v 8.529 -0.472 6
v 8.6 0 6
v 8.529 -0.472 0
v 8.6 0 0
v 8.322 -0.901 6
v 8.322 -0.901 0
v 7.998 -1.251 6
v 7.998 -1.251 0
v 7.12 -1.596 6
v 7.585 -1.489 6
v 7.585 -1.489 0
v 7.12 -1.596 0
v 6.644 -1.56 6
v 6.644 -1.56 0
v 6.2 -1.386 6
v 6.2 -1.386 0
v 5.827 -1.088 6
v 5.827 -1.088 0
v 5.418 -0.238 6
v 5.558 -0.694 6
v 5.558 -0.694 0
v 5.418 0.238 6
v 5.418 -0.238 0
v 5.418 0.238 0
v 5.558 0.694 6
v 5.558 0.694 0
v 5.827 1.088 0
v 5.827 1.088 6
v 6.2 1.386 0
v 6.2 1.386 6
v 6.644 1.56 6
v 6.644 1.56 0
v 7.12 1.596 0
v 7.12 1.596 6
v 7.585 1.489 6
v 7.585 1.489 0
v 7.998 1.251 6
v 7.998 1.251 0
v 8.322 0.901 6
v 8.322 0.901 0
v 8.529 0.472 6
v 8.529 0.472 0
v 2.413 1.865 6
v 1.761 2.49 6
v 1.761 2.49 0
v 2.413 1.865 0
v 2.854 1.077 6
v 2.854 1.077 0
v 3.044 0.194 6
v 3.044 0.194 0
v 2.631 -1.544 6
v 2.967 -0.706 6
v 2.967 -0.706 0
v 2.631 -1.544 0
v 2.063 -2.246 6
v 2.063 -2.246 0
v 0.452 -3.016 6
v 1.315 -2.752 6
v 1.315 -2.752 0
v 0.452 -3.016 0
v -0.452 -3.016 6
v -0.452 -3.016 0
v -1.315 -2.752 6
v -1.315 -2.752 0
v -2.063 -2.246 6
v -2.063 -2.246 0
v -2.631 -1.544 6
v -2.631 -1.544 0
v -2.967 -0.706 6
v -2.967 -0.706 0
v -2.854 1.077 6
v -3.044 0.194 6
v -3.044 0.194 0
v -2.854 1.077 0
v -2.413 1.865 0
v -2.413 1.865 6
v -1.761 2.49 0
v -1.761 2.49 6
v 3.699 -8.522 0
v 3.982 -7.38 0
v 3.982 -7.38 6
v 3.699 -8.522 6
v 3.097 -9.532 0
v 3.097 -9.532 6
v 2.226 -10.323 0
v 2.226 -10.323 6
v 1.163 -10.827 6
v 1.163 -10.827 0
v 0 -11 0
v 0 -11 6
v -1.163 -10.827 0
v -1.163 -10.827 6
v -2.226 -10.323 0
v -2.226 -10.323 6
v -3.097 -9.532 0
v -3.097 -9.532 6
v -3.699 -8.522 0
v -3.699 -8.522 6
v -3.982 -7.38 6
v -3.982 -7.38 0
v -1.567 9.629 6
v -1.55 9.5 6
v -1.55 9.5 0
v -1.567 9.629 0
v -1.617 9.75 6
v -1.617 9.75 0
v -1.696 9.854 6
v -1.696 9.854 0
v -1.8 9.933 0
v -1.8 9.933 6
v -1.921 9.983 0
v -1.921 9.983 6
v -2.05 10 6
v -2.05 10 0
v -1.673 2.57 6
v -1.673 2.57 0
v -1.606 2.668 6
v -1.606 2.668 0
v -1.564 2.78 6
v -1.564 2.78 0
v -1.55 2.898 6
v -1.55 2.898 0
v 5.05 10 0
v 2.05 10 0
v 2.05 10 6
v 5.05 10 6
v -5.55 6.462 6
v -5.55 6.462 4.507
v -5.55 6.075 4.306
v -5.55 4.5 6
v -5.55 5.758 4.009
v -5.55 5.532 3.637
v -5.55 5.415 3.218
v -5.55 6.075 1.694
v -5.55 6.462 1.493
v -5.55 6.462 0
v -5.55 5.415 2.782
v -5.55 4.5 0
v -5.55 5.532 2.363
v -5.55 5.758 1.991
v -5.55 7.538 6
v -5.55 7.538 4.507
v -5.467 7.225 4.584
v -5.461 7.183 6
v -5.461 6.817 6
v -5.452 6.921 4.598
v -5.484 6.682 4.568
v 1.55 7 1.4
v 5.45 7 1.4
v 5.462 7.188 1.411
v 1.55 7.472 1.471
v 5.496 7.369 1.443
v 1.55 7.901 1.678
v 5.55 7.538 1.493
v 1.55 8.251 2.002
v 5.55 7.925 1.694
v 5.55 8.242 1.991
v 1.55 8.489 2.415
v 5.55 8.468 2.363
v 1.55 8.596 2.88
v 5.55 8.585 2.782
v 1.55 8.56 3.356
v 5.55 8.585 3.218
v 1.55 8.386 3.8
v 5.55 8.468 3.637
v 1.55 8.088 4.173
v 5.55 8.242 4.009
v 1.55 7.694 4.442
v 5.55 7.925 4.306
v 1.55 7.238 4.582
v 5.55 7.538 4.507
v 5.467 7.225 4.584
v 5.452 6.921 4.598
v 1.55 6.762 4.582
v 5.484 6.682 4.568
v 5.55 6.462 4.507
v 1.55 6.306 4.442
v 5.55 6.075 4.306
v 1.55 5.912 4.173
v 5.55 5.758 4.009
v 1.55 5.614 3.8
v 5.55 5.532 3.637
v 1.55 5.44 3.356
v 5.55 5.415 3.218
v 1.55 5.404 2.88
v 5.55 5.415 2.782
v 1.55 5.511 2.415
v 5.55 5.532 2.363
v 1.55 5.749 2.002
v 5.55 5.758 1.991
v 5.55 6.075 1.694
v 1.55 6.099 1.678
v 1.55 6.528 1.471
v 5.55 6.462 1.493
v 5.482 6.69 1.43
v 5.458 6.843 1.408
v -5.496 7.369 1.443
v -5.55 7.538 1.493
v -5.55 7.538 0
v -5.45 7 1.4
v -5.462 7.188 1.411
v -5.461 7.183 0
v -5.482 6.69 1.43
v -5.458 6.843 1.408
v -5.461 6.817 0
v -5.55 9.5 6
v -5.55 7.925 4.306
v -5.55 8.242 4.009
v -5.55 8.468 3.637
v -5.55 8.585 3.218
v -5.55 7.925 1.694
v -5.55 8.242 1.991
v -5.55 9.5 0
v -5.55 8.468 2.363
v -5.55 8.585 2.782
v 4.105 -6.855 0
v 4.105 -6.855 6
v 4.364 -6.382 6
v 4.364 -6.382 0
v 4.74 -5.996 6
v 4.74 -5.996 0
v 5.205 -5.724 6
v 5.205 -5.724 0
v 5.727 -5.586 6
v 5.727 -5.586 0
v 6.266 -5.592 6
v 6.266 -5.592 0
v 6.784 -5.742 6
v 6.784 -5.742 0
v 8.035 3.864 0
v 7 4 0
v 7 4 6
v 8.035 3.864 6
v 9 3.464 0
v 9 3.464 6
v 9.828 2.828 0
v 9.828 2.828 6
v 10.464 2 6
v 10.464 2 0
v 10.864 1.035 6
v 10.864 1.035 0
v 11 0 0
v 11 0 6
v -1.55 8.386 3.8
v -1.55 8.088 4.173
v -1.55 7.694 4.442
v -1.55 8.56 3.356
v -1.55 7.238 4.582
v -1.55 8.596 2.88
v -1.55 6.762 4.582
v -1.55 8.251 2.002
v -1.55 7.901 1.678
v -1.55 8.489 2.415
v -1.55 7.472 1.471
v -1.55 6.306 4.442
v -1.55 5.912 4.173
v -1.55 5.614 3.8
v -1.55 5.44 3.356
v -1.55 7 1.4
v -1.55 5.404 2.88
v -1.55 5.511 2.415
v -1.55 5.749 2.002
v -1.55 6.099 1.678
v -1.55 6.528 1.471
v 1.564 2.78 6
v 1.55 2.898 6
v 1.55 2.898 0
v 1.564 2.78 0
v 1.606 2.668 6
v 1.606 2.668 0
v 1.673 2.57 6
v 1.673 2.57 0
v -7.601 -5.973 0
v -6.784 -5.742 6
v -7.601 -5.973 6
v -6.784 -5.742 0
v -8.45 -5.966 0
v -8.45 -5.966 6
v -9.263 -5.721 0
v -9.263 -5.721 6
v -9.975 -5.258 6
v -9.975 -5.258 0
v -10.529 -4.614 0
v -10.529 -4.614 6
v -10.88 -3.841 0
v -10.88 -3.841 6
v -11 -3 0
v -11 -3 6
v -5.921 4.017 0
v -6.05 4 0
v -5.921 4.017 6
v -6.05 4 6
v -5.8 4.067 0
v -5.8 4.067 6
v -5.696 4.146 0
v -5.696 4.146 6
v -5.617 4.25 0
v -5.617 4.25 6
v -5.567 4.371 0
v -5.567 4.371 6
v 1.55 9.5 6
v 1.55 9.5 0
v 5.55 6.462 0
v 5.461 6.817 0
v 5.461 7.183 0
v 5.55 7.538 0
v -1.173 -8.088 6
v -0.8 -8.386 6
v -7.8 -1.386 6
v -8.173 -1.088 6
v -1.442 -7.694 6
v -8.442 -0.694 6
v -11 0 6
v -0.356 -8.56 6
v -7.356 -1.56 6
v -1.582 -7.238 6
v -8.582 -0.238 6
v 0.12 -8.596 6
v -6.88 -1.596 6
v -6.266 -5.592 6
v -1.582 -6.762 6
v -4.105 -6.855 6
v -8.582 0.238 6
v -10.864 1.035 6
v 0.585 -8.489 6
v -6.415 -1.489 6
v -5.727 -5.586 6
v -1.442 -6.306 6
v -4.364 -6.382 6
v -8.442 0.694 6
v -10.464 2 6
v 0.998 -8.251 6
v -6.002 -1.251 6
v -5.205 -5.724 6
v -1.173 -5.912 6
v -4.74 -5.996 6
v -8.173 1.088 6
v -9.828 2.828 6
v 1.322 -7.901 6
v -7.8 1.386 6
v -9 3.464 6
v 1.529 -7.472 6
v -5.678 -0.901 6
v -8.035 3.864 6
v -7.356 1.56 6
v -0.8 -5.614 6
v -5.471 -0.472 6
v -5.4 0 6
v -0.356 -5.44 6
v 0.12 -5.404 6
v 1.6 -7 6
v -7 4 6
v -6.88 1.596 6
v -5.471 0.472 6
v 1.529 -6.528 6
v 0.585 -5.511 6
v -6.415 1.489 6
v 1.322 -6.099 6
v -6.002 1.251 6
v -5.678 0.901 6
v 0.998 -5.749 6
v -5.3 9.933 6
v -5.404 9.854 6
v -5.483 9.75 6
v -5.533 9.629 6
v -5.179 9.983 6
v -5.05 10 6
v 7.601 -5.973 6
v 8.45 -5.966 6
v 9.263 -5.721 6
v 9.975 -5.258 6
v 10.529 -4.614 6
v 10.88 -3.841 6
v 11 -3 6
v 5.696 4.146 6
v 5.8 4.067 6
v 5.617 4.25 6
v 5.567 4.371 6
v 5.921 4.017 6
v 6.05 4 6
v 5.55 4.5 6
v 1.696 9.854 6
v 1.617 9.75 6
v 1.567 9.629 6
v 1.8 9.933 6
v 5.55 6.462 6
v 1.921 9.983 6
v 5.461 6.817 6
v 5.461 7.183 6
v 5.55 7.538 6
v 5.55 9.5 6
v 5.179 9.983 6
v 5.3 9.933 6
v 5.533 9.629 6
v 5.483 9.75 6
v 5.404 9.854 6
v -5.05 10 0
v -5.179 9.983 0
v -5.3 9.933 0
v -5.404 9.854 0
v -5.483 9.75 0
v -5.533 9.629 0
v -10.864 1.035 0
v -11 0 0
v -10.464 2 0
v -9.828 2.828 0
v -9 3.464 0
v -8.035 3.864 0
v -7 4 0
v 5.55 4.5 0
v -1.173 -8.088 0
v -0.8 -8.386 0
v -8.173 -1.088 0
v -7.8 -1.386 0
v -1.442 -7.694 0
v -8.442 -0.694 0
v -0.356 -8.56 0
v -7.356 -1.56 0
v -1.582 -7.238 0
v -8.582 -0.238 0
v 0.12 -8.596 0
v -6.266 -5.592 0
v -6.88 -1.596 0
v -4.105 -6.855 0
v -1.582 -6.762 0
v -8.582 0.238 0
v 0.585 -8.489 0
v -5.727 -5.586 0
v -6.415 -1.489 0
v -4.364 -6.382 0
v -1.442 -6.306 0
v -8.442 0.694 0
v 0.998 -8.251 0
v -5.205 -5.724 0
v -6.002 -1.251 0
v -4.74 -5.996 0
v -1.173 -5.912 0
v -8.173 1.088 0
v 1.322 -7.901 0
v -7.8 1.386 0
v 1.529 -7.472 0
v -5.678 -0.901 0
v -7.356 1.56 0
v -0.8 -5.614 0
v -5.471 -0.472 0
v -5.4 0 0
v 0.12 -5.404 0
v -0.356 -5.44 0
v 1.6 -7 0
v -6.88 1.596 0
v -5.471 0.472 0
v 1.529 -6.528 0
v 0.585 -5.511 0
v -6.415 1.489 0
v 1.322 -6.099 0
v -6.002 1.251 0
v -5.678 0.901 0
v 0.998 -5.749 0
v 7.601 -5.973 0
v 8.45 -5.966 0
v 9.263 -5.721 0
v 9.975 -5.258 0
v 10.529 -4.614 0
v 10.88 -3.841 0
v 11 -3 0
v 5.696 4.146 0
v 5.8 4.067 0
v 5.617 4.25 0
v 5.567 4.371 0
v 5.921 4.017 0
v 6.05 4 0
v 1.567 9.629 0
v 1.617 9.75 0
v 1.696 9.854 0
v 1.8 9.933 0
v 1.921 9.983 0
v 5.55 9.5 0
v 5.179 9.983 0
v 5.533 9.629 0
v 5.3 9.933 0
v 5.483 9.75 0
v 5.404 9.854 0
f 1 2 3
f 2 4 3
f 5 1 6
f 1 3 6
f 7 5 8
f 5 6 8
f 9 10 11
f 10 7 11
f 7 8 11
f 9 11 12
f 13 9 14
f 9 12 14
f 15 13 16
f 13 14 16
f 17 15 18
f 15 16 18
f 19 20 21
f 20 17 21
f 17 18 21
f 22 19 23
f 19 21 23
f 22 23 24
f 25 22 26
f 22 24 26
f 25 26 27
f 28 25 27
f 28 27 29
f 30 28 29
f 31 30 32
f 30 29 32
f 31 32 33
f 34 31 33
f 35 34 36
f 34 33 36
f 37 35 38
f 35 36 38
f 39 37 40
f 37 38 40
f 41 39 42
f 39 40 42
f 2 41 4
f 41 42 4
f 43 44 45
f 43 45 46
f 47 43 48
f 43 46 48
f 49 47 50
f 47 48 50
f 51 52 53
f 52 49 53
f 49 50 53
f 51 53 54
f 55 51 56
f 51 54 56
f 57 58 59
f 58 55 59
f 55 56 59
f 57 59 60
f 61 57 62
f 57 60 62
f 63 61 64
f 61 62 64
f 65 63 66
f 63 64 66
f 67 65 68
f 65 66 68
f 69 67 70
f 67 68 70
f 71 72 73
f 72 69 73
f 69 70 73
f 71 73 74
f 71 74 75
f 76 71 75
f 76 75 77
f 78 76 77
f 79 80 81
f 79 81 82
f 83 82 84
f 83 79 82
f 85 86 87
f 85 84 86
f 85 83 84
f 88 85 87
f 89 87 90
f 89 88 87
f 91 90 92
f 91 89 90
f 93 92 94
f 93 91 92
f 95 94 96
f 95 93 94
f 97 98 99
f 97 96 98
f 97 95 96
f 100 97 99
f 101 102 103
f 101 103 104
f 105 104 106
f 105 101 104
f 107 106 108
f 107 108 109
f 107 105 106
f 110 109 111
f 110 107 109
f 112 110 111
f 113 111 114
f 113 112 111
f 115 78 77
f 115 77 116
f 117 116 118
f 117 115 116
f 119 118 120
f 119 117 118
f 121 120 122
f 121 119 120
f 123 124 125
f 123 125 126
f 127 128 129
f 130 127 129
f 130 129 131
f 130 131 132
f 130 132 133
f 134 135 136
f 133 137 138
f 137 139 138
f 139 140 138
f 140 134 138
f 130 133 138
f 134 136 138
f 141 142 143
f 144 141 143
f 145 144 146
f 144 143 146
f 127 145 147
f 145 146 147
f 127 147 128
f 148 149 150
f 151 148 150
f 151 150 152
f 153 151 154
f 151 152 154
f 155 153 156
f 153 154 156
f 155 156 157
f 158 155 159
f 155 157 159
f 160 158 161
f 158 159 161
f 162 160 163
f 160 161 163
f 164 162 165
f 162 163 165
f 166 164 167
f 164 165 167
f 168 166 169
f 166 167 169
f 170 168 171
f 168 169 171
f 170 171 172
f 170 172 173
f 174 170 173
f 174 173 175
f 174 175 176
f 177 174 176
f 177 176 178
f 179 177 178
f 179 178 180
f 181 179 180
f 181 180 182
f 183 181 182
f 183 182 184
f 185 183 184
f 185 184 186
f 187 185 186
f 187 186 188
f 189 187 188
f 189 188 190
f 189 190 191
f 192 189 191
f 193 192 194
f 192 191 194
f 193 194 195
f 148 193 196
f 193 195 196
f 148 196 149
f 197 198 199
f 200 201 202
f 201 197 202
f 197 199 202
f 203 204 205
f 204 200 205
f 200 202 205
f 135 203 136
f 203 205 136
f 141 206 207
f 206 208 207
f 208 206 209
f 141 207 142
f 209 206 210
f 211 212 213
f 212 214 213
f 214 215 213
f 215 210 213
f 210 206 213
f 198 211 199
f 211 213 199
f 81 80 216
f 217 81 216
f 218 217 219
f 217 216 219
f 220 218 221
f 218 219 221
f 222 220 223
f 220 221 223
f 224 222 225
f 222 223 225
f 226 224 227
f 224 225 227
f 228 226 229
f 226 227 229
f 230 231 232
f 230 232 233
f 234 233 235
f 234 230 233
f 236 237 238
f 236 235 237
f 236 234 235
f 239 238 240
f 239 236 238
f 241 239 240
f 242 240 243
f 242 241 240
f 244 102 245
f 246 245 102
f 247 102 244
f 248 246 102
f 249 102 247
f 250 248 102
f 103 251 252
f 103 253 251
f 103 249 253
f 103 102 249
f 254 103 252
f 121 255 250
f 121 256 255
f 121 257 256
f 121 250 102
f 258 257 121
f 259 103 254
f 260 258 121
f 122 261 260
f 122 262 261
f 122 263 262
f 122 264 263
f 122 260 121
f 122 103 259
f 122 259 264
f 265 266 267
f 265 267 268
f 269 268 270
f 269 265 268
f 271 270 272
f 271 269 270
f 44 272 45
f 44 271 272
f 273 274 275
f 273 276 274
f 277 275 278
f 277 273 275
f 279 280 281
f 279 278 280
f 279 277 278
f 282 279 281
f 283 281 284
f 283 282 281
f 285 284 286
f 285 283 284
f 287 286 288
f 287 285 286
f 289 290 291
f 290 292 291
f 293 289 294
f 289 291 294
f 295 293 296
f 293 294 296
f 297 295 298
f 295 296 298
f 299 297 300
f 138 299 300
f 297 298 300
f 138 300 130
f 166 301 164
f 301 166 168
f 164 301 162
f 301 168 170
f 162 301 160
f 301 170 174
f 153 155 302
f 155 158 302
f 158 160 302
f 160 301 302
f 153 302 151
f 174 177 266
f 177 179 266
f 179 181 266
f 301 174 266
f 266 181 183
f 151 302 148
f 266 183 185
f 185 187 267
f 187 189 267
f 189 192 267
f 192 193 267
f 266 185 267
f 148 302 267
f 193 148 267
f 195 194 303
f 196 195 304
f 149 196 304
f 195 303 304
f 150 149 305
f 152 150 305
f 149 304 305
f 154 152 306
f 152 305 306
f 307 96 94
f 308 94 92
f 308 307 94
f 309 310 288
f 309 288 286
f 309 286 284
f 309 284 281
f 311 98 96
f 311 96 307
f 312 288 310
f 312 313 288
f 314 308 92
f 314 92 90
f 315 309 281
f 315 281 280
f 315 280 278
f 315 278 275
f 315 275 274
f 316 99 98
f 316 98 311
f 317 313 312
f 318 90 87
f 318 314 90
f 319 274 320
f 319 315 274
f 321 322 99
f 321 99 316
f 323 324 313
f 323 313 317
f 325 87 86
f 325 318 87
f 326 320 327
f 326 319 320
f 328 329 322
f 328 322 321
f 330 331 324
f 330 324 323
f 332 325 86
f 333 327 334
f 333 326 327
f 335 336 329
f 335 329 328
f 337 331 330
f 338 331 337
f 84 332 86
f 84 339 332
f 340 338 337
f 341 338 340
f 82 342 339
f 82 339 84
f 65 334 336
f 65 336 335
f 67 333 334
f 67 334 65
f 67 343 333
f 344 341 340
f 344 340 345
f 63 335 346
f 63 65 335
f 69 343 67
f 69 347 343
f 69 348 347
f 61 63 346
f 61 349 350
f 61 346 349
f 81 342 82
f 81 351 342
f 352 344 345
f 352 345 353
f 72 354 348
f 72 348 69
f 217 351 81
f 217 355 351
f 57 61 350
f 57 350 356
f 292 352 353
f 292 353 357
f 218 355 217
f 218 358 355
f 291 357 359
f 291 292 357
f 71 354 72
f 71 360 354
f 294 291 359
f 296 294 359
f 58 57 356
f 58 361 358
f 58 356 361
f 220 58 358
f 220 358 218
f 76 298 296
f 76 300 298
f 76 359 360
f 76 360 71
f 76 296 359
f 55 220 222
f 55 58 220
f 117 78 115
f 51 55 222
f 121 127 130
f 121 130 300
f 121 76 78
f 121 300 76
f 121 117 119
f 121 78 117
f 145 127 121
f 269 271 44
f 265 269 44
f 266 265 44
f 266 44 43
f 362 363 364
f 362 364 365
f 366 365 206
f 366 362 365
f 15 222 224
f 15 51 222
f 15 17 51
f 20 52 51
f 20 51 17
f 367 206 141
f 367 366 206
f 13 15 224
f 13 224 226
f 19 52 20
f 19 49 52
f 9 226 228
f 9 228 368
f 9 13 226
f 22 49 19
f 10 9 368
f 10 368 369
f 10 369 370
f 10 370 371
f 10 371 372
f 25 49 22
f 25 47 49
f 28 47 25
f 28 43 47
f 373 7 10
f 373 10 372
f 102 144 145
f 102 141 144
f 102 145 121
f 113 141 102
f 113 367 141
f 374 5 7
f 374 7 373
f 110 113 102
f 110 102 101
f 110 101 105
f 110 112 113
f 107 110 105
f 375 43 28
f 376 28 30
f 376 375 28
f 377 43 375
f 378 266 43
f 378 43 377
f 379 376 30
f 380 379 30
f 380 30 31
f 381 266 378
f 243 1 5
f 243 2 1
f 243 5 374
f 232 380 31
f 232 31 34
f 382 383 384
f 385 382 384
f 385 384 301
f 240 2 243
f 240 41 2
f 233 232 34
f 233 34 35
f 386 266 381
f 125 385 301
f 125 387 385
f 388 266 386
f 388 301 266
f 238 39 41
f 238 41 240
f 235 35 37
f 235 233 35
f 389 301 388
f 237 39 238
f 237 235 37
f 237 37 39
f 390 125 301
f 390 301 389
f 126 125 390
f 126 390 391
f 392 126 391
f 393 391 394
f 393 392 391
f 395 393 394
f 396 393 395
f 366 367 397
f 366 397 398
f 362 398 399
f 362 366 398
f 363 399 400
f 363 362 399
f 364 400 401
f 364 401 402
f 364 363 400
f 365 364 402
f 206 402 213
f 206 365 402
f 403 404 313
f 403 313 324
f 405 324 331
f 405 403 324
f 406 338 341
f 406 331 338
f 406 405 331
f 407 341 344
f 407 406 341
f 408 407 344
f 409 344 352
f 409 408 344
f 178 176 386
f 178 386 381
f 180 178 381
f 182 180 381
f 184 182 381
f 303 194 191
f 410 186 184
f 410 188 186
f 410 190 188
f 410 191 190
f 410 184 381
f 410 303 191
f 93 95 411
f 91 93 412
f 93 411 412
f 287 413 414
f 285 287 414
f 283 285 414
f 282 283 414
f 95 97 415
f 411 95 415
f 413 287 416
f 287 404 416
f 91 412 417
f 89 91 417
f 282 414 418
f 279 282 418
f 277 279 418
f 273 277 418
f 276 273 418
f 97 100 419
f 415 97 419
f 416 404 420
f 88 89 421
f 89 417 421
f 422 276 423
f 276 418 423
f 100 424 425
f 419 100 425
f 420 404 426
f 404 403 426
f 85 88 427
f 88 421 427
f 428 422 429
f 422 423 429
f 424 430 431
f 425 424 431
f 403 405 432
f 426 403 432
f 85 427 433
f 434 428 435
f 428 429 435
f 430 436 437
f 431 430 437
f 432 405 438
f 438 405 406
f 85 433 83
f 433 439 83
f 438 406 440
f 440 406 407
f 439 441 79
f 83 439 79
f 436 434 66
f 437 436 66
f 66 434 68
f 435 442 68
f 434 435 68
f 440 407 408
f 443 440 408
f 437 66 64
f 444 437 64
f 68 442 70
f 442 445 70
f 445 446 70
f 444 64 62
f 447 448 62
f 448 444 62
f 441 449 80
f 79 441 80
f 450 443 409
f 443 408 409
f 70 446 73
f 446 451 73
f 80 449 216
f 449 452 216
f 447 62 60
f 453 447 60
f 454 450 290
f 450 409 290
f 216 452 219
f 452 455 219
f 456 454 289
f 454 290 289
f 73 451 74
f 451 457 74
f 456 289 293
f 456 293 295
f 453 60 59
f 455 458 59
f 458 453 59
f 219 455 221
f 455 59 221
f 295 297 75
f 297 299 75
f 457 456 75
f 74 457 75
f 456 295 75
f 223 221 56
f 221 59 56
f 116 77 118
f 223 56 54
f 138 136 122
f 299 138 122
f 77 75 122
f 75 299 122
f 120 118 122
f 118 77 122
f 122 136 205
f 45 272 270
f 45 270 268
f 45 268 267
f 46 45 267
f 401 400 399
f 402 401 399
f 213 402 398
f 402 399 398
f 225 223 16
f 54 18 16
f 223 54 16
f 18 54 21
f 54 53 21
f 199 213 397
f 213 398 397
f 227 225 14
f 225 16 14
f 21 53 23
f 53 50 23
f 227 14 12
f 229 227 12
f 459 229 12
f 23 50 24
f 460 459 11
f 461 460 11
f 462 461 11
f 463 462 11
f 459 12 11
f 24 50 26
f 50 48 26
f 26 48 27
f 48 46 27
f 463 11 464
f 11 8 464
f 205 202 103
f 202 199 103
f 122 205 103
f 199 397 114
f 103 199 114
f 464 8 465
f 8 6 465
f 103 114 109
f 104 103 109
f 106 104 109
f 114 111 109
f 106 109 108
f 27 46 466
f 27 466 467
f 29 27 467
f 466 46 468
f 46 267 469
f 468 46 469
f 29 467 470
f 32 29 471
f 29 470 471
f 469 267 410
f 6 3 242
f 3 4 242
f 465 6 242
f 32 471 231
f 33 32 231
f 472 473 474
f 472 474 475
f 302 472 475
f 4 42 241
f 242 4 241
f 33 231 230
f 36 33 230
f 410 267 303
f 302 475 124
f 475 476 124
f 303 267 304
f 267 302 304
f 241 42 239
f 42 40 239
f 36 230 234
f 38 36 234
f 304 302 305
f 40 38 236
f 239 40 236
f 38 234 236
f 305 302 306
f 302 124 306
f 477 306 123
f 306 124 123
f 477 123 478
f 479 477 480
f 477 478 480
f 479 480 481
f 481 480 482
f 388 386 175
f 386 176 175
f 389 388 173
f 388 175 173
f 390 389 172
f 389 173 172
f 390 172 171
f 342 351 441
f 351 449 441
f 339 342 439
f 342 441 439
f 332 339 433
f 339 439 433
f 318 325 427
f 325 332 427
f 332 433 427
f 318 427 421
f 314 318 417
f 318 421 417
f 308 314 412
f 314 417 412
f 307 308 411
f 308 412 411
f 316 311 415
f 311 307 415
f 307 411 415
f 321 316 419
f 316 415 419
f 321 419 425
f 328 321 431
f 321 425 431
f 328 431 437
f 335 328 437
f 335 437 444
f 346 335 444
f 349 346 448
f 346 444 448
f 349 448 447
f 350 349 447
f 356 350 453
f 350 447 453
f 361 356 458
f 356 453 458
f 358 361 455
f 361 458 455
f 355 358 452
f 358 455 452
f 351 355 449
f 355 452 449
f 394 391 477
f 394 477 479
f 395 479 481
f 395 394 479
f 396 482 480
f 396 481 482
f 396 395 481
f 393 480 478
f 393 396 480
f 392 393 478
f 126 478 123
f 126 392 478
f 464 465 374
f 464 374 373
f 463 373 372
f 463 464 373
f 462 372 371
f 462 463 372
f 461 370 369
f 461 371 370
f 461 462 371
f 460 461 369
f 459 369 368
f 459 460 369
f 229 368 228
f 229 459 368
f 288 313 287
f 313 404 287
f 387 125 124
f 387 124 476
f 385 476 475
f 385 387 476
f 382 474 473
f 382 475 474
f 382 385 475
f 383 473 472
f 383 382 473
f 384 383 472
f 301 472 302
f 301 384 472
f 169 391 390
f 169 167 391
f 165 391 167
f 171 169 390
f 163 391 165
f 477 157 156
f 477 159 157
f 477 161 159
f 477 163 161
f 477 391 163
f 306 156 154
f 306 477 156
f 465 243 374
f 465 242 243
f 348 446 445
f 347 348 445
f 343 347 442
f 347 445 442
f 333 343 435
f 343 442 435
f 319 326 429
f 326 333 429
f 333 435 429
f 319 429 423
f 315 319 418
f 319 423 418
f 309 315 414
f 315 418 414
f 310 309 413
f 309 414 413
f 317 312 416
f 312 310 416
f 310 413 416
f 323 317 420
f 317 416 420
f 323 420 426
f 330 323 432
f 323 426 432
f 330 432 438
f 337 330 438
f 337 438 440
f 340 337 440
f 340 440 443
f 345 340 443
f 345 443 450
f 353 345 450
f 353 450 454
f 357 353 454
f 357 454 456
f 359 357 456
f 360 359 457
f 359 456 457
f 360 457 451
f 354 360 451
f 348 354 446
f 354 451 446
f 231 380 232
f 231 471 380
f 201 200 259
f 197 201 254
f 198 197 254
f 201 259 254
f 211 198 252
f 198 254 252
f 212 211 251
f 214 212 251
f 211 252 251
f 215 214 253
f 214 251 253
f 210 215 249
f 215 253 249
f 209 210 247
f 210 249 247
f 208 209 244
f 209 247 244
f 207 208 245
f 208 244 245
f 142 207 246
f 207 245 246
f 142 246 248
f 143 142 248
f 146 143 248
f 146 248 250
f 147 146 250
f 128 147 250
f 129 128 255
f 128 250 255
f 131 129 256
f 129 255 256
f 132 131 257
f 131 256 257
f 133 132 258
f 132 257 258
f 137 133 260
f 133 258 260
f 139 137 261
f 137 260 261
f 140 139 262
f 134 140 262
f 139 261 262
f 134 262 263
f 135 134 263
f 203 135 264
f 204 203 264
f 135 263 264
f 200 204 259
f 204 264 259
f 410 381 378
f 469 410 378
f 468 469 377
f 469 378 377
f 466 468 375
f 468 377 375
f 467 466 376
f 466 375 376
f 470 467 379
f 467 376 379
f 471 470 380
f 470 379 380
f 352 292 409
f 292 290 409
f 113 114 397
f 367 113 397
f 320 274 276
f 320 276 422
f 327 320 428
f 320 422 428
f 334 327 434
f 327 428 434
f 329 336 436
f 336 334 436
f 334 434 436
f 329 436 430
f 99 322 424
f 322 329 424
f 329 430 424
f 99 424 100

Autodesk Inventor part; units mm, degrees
ref_plane "YZ Plane" through (0, 0, 0) normal (1, 0, 0) x (0, 1, 0)
ref_plane "XZ Plane" through (0, 0, 0) normal (0, 1, 0) x (-1, 0, 0)
ref_plane "XY Plane" through (0, 0, 0) normal (0, 0, 1) x (1, 0, 0)
sketch "スケッチ1" plane through (0, 0, 0) normal (0, 0, 1) x (1, 0, 0)
  arc A0 (-1.55, 2.6268) -> (1.55, 2.6268) centre (0, 0) ccw
  circle A1 centre (-7, 0) radius 1.6
  circle A2 centre (7, 0) radius 1.6
  arc A3 (-7, 4) -> (-11, 0) centre (-7, 0) ccw
  arc A4 (11, 0) -> (7, 4) centre (7, 0) ccw
  line L0 (-1.55, 10) -> (-1.55, 2.6268)
  line L1 (1.55, 10) -> (1.55, 2.6268)
  circle A5 centre (0, -7) radius 1.6
  line L2 (1.55, 10) -> (5.55, 10)
  line L3 (5.55, 10) -> (5.55, 7.5385)
  line L4 (5.55, 4) -> (7, 4)
  line L5 (-1.55, 10) -> (-5.55, 10)
  line L6 (-5.55, 10) -> (-5.55, 7.5385)
  line L7 (-5.55, 4) -> (-7, 4)
  line L8 (-11, 0) -> (-11, -3)
  arc A6 (-11, -3) -> (-6.7837, -5.7424) centre (-8, -3) ccw
  arc A7 (1.55, 2.6268) -> (-1.55, 2.6268) centre (0, 0) ccw construction
  arc A8 (-3.9819, -7.3804) -> (3.9819, -7.3804) centre (0, -7) ccw
  arc A9 (-3.9819, -7.3804) -> (-6.7837, -5.7424) centre (-5.9728, -7.5706) ccw
  line L9 (11, 0) -> (11, -3)
  arc A10 (6.7837, -5.7424) -> (11, -3) centre (8, -3) ccw
  arc A11 (6.7837, -5.7424) -> (3.9819, -7.3804) centre (5.9728, -7.5706) ccw
  arc A12 (-5.55, 7.5385) -> (-5.55, 6.4615) centre (-6.95, 7) ccw construction
  arc A13 (5.55, 6.4615) -> (5.55, 7.5385) centre (6.95, 7) ccw construction
  arc A14 (-5.55, 6.4615) -> (-5.55, 7.5385) centre (-6.95, 7) ccw
  arc A15 (5.55, 7.5385) -> (5.55, 6.4615) centre (6.95, 7) ccw
  line L10 (5.55, 6.4615) -> (5.55, 4)
  line L11 (5.55, 7.5385) -> (5.55, 6.4615) construction
  line L12 (-5.55, 6.4615) -> (-5.55, 4)
  line L13 (-5.55, 7.5385) -> (-5.55, 6.4615) construction
  dimension "d0" = 6.1
  dimension "d1" = 3.2
  dimension "d2" = 3.2
  dimension "d4" = 7
  dimension "d5" = 7
  dimension "d6" = 3.2
  dimension "d7" = 7
  dimension "d8" = 6
  dimension "d9" = 4
  dimension "d10" = 3.1
  dimension "d11" = 4
  dimension "d12" = 4
  dimension "d13" = 1.55
  dimension "d14" = 3
  dimension "d15" = 3
  dimension "d16" = 4
  dimension "d17" = 4
  dimension "d18" = 3
  dimension "d19" = 3
  dimension "d20" = 2
  dimension "d21" = 2
  dimension "d22" = 3
  dimension "d23" = 3
  dimension "d24" = 1.4
  dimension "d25" = 1.4
  dimension "d26" = 3
  dimension "d27" = 3
extrude "押し出し1" add sketch "スケッチ1" along normal blind 6
sketch "スケッチ2" plane through (5.55, 4, 0) normal (1, 0, 0) x (0, 0, -1)
  circle A0 centre (-3, 3) radius 1.6
  line L0 (0, 6) -> (-6, 6) projected
  point P0 (0, -4)
  dimension "d30" = 3.2
  dimension "d31" = 3
  dimension "d32" = 3
extrude "押し出し2" cut sketch "スケッチ2" against normal through all
fillet "フィレット1" radius 0.5 8 edges at (-5.55, 10, 3) (-1.55, 10, 3) (1.55, 10, 3) (5.55, 10, 3) (5.55, 4, 3) (-5.55, 4, 3) (-1.55, 2.6268, 3) (1.55, 2.6268, 3)
properties part number "カップリング_軸6mm"
